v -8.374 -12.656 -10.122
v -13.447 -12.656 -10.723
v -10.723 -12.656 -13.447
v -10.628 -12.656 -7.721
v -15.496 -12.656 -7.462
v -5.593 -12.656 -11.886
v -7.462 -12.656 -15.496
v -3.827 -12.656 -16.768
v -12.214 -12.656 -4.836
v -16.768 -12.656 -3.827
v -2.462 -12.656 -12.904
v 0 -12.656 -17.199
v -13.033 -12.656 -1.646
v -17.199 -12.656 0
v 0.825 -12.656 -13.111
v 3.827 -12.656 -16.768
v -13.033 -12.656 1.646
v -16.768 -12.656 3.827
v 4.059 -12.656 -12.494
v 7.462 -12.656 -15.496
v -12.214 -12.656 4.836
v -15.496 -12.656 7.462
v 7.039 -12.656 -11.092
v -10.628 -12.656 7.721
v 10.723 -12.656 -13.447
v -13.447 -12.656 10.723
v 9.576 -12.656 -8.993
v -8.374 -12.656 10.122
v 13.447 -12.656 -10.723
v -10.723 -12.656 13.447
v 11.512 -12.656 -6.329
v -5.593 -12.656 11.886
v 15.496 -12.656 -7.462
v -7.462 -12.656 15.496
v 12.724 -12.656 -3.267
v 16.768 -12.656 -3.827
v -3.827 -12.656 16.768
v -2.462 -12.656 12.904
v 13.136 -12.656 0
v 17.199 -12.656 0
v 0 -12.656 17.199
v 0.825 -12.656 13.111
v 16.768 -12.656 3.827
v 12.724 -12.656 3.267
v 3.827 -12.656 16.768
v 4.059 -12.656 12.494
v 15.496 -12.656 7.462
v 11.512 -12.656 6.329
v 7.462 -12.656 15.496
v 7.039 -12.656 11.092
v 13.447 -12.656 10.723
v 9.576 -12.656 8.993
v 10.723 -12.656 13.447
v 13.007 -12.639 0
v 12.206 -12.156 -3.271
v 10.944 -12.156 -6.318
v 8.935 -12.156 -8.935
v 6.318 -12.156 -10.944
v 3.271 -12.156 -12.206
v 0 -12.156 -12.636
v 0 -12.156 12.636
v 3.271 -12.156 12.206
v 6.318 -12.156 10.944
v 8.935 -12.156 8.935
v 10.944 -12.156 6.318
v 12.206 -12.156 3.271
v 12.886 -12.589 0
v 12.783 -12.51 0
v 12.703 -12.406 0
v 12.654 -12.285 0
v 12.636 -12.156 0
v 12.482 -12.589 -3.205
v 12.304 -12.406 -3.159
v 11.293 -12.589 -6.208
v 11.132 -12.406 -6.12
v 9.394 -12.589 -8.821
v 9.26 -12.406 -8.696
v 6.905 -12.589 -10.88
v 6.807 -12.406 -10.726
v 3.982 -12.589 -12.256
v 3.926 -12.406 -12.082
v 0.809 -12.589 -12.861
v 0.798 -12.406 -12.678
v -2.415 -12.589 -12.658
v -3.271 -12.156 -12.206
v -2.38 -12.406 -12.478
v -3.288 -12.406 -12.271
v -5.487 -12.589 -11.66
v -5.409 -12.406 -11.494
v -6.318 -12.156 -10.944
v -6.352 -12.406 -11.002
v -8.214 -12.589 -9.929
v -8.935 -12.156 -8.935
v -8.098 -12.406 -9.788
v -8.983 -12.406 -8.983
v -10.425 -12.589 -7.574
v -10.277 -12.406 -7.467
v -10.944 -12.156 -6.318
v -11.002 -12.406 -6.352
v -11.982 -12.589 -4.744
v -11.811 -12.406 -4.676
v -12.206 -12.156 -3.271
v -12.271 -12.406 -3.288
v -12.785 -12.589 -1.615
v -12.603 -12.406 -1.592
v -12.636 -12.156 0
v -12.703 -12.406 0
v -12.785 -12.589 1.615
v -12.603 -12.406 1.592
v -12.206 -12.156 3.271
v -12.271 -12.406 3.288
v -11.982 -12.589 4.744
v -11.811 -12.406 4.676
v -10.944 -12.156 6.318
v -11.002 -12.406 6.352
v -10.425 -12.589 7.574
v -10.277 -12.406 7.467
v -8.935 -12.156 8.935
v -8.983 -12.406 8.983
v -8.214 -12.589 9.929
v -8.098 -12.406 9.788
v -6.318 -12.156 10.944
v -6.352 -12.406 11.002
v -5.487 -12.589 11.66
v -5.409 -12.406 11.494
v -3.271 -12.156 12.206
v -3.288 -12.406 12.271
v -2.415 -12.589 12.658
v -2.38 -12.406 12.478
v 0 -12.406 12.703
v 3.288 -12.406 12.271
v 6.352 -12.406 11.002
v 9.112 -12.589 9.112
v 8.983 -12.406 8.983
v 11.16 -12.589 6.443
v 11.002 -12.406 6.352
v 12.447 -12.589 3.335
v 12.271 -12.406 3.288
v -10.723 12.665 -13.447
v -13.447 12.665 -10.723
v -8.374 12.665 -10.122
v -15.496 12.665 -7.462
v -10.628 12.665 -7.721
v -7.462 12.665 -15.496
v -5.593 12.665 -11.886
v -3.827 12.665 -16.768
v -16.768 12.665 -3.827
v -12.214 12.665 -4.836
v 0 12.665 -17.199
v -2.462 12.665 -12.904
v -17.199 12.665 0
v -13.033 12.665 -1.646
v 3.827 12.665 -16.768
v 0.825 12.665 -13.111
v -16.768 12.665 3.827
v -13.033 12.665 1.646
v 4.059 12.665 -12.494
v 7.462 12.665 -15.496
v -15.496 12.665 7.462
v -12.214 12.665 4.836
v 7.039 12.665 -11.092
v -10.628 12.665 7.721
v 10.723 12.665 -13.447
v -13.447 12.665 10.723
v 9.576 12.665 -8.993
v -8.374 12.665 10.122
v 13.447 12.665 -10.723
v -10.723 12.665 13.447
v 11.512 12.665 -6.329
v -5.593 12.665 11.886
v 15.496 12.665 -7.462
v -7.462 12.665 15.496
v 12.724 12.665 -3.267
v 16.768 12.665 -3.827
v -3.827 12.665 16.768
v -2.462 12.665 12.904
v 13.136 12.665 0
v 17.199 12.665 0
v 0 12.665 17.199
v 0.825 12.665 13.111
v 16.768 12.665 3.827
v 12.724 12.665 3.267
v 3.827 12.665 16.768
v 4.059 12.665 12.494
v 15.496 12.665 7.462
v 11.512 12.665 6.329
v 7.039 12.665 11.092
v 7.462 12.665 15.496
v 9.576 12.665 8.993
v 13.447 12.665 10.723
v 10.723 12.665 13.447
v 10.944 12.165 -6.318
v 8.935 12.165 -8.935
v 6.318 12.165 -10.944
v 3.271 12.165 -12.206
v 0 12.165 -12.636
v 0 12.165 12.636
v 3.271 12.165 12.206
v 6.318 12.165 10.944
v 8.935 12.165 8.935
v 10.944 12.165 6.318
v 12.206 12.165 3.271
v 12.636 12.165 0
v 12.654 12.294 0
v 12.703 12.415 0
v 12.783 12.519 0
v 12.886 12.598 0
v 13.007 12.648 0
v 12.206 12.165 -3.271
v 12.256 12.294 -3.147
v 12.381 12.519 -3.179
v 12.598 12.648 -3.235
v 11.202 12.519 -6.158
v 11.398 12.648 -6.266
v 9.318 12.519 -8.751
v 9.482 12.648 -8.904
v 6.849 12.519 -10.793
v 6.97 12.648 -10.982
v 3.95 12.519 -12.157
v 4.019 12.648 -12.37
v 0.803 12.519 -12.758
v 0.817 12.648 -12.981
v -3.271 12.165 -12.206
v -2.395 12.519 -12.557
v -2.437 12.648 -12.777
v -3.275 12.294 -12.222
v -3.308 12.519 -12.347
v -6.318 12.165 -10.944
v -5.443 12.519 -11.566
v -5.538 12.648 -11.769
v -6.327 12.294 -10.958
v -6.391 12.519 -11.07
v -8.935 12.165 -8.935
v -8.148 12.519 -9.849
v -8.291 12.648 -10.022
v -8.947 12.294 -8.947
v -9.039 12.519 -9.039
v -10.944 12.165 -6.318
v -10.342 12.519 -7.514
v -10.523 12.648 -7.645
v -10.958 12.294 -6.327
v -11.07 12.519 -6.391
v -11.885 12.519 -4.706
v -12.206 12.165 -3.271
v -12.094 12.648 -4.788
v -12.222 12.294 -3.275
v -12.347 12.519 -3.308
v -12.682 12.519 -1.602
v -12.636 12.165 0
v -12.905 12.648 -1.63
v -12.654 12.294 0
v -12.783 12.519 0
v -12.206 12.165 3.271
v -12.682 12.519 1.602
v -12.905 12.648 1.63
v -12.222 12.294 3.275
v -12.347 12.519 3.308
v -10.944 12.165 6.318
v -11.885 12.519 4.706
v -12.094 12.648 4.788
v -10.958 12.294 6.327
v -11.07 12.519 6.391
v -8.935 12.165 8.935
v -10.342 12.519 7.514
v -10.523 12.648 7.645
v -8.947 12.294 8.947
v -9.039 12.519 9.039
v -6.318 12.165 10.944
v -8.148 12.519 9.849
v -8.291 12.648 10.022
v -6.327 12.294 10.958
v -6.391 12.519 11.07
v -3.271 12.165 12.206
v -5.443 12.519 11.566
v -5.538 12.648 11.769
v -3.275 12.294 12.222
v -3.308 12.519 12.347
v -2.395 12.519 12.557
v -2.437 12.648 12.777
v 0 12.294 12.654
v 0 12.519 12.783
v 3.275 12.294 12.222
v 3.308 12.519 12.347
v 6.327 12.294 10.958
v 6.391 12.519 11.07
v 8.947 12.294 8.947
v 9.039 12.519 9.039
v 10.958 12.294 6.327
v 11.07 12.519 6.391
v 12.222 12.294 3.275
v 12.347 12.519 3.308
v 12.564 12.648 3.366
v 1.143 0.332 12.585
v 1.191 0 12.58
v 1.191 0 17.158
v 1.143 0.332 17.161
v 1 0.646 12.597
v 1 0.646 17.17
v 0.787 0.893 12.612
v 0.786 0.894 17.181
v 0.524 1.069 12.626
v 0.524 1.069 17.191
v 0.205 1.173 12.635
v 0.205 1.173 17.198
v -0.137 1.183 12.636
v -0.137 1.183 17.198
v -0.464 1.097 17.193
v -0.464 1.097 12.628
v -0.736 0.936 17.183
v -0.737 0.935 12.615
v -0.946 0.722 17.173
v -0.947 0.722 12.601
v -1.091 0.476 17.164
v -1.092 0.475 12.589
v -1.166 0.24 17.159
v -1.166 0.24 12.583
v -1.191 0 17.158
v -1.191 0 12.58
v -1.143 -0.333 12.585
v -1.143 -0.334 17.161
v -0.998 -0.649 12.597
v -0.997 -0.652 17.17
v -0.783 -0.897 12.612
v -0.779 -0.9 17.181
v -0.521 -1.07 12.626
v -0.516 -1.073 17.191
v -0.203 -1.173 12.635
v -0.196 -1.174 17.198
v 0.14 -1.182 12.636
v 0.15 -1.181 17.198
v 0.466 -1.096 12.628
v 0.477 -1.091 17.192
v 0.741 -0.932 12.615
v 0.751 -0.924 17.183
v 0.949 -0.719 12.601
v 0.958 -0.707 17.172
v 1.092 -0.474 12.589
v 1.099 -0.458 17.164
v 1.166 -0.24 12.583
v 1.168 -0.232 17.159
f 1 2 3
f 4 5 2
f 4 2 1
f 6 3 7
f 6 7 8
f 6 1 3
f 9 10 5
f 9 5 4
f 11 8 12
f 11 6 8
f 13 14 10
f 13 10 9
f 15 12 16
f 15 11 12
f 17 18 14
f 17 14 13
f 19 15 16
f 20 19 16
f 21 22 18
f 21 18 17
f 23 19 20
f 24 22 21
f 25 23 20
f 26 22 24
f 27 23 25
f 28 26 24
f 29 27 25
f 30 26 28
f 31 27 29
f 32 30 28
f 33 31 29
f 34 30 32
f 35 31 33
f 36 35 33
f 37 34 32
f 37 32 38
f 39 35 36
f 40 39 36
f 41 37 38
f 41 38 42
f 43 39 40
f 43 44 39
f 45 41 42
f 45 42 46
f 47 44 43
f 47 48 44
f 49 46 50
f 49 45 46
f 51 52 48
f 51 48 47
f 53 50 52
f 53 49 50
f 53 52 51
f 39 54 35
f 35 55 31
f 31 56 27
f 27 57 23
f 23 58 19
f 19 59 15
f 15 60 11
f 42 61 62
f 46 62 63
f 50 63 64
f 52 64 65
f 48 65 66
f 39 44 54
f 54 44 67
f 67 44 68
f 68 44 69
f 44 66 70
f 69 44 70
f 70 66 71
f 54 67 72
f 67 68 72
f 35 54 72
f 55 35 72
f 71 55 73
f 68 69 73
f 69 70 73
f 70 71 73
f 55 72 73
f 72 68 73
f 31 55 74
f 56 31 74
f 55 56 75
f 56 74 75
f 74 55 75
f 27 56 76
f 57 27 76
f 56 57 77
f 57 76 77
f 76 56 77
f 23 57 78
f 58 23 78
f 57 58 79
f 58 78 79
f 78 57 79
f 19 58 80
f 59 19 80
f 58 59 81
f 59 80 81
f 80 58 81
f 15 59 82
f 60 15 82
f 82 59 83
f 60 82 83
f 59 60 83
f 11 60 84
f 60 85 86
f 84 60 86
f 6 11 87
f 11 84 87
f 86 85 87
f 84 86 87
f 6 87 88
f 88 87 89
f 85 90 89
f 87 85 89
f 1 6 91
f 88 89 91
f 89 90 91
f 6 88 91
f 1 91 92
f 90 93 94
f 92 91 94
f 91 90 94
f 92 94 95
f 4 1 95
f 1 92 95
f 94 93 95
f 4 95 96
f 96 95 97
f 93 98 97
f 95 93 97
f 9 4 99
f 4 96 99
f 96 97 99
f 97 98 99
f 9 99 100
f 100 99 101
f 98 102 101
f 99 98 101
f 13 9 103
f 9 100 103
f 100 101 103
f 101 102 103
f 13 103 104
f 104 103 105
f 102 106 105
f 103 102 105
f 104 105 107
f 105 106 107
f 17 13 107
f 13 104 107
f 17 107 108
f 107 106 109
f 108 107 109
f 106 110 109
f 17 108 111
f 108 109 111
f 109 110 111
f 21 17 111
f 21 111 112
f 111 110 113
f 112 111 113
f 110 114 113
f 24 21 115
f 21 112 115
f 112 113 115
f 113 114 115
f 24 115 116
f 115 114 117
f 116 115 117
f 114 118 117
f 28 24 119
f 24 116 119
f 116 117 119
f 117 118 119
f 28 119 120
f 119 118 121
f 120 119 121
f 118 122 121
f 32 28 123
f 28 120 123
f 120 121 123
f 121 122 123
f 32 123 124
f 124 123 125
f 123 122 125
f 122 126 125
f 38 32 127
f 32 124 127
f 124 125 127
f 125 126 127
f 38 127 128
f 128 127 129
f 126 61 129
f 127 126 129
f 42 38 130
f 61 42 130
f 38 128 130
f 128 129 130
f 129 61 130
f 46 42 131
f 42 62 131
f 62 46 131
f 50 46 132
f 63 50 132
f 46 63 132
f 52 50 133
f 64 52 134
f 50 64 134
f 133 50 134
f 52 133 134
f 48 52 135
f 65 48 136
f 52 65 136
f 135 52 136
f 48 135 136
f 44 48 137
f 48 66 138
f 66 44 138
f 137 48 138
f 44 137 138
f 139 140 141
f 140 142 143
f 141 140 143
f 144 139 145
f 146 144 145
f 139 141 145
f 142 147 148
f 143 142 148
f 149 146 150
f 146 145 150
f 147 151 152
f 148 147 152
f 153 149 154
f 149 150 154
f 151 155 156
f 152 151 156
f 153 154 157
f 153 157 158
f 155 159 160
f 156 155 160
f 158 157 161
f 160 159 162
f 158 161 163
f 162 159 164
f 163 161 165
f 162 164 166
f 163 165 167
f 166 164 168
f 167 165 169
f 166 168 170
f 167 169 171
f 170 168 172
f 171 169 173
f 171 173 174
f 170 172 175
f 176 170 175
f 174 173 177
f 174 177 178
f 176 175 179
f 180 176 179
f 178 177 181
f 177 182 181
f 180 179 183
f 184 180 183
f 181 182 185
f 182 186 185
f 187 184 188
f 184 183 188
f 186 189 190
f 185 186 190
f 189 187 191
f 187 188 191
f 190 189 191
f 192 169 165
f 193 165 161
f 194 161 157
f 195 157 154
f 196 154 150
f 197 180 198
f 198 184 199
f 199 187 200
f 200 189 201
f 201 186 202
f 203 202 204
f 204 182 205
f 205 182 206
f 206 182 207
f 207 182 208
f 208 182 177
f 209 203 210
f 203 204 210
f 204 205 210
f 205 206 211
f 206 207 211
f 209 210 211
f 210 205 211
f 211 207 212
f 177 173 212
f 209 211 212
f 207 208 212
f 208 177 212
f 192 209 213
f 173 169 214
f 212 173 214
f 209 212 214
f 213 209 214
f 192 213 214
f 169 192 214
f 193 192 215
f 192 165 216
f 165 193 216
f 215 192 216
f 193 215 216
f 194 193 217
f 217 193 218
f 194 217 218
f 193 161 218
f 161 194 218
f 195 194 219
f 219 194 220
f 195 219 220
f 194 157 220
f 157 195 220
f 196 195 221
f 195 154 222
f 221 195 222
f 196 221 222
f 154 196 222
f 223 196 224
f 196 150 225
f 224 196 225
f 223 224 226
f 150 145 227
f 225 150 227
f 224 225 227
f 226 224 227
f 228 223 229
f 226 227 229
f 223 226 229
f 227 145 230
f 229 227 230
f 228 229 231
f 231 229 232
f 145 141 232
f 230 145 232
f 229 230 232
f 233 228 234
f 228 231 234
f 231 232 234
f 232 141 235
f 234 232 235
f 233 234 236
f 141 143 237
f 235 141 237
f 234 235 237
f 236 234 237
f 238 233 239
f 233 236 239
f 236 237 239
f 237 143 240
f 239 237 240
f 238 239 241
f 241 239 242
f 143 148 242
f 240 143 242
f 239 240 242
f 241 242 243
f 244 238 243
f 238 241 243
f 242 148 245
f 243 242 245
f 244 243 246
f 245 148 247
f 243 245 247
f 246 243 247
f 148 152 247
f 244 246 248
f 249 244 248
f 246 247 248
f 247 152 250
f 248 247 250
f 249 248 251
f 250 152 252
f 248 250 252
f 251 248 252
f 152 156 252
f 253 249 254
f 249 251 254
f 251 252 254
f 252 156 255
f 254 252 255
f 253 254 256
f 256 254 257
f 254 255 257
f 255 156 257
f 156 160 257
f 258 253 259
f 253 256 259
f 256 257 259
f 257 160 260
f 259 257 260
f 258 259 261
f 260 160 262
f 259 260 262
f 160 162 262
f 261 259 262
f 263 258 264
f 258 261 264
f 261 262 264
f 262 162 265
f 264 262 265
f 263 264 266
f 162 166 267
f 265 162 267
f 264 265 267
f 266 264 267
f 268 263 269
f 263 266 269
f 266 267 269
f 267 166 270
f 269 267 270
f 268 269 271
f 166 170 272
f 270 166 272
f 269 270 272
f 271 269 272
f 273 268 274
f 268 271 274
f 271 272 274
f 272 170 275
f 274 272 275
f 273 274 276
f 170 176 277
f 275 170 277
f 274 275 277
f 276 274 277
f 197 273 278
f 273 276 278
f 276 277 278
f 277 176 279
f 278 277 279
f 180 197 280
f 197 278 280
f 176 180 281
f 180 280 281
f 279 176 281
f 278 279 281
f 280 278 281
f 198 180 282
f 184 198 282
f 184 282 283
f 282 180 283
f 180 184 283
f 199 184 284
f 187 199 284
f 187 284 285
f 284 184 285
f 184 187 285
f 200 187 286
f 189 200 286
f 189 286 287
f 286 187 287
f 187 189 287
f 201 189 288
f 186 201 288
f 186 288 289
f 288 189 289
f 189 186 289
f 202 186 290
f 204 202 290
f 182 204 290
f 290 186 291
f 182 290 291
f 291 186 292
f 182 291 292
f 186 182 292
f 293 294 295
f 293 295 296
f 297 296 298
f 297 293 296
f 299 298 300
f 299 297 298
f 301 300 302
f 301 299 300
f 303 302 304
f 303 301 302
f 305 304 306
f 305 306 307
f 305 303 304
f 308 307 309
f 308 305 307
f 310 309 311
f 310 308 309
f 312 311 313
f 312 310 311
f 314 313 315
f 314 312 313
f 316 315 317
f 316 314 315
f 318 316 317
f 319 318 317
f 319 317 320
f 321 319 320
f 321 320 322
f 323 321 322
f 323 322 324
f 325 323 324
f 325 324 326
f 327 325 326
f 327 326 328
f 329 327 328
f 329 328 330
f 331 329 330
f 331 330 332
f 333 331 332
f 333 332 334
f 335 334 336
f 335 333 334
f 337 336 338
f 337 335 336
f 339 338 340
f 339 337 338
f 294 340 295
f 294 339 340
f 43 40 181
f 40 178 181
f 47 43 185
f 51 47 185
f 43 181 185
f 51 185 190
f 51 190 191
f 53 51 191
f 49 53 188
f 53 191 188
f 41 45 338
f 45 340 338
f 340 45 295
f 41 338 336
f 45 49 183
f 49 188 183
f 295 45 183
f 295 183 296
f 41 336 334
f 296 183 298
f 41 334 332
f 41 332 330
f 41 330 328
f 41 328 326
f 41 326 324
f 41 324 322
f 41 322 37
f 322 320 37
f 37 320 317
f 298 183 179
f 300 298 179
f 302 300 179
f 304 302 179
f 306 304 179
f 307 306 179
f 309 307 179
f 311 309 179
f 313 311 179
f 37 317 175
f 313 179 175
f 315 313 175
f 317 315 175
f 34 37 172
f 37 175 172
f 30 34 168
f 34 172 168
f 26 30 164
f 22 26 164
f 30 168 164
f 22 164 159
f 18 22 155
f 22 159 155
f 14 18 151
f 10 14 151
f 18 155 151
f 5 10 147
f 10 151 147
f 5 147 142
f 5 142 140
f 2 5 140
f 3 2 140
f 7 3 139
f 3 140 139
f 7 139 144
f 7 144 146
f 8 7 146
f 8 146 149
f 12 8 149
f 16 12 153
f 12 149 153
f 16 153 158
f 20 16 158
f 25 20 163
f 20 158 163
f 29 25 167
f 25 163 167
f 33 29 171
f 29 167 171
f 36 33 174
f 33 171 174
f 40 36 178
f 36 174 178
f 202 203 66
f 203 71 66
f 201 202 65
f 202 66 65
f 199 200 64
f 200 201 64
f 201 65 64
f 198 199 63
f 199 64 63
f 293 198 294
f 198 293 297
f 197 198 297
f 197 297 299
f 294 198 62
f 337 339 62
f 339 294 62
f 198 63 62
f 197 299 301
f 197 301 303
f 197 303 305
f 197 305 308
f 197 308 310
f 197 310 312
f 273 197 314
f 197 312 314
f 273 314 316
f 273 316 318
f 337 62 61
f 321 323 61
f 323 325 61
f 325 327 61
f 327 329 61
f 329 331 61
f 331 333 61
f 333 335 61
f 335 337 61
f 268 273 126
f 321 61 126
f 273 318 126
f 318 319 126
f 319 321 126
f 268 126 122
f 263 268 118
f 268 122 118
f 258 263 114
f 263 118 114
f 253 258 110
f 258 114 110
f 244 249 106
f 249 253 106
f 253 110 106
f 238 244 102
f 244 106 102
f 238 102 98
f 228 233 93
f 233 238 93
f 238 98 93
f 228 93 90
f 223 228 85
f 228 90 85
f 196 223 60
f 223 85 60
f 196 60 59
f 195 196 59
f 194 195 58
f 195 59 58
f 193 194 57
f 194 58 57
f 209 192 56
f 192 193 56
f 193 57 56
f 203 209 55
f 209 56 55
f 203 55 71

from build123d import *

# Parameters (mm, degrees)
F2_R          = 17.199
F2_R_2        = 12.6365
F3_DEPTH      = 12.665
F3_DEPTH_BACK = 12.656
F5_R          = 1.190625
F6_DEPTH      = 17.2


with BuildPart() as f1:
    # F0 (on Top) → F1 (revolve)
    with BuildSketch(Plane.XY):
        with BuildLine():
            Line((13.1365, 12.665), (17.399, 12.665))
            Line((17.399, 12.665), (17.399, 14.165))
            Line((17.399, 14.165), (11.1365, 14.165))
            Line((11.1365, 14.165), (11.1365, -14.156))
            Line((11.1365, -14.156), (17.399, -14.156))
            Line((17.399, -14.156), (17.399, -12.656))
            Line((17.399, -12.656), (13.1365, -12.656))
            ThreePointArc((13.1365, -12.656), (12.7829466094, -12.5095533906), (12.6365, -12.156))
            Line((12.6365, -12.156), (12.6365, 12.165))
            ThreePointArc((12.6365, 12.165), (12.7829466094, 12.5185533906), (13.1365, 12.665))
        make_face()
    revolve(axis=Axis((0, 2.8540128842, 0), (0, 1, 0)))


with BuildPart() as f3:
    # F2 (on Front) → F3 (new body, two sides)
    with BuildSketch(Plane.XZ) as f3_sk:
        Circle(F2_R)
        Circle(F2_R_2, mode=Mode.SUBTRACT)
    extrude(amount=-F3_DEPTH)
    extrude(f3_sk.sketch, amount=F3_DEPTH_BACK)

    # F4: cut F1
    add(f1.part, mode=Mode.SUBTRACT)

    # F5 (on Top) → F6 (cut, through all)
    with BuildSketch(Plane.XY):
        Circle(F5_R)
    extrude(amount=F6_DEPTH, mode=Mode.SUBTRACT)


solid = f3.part
